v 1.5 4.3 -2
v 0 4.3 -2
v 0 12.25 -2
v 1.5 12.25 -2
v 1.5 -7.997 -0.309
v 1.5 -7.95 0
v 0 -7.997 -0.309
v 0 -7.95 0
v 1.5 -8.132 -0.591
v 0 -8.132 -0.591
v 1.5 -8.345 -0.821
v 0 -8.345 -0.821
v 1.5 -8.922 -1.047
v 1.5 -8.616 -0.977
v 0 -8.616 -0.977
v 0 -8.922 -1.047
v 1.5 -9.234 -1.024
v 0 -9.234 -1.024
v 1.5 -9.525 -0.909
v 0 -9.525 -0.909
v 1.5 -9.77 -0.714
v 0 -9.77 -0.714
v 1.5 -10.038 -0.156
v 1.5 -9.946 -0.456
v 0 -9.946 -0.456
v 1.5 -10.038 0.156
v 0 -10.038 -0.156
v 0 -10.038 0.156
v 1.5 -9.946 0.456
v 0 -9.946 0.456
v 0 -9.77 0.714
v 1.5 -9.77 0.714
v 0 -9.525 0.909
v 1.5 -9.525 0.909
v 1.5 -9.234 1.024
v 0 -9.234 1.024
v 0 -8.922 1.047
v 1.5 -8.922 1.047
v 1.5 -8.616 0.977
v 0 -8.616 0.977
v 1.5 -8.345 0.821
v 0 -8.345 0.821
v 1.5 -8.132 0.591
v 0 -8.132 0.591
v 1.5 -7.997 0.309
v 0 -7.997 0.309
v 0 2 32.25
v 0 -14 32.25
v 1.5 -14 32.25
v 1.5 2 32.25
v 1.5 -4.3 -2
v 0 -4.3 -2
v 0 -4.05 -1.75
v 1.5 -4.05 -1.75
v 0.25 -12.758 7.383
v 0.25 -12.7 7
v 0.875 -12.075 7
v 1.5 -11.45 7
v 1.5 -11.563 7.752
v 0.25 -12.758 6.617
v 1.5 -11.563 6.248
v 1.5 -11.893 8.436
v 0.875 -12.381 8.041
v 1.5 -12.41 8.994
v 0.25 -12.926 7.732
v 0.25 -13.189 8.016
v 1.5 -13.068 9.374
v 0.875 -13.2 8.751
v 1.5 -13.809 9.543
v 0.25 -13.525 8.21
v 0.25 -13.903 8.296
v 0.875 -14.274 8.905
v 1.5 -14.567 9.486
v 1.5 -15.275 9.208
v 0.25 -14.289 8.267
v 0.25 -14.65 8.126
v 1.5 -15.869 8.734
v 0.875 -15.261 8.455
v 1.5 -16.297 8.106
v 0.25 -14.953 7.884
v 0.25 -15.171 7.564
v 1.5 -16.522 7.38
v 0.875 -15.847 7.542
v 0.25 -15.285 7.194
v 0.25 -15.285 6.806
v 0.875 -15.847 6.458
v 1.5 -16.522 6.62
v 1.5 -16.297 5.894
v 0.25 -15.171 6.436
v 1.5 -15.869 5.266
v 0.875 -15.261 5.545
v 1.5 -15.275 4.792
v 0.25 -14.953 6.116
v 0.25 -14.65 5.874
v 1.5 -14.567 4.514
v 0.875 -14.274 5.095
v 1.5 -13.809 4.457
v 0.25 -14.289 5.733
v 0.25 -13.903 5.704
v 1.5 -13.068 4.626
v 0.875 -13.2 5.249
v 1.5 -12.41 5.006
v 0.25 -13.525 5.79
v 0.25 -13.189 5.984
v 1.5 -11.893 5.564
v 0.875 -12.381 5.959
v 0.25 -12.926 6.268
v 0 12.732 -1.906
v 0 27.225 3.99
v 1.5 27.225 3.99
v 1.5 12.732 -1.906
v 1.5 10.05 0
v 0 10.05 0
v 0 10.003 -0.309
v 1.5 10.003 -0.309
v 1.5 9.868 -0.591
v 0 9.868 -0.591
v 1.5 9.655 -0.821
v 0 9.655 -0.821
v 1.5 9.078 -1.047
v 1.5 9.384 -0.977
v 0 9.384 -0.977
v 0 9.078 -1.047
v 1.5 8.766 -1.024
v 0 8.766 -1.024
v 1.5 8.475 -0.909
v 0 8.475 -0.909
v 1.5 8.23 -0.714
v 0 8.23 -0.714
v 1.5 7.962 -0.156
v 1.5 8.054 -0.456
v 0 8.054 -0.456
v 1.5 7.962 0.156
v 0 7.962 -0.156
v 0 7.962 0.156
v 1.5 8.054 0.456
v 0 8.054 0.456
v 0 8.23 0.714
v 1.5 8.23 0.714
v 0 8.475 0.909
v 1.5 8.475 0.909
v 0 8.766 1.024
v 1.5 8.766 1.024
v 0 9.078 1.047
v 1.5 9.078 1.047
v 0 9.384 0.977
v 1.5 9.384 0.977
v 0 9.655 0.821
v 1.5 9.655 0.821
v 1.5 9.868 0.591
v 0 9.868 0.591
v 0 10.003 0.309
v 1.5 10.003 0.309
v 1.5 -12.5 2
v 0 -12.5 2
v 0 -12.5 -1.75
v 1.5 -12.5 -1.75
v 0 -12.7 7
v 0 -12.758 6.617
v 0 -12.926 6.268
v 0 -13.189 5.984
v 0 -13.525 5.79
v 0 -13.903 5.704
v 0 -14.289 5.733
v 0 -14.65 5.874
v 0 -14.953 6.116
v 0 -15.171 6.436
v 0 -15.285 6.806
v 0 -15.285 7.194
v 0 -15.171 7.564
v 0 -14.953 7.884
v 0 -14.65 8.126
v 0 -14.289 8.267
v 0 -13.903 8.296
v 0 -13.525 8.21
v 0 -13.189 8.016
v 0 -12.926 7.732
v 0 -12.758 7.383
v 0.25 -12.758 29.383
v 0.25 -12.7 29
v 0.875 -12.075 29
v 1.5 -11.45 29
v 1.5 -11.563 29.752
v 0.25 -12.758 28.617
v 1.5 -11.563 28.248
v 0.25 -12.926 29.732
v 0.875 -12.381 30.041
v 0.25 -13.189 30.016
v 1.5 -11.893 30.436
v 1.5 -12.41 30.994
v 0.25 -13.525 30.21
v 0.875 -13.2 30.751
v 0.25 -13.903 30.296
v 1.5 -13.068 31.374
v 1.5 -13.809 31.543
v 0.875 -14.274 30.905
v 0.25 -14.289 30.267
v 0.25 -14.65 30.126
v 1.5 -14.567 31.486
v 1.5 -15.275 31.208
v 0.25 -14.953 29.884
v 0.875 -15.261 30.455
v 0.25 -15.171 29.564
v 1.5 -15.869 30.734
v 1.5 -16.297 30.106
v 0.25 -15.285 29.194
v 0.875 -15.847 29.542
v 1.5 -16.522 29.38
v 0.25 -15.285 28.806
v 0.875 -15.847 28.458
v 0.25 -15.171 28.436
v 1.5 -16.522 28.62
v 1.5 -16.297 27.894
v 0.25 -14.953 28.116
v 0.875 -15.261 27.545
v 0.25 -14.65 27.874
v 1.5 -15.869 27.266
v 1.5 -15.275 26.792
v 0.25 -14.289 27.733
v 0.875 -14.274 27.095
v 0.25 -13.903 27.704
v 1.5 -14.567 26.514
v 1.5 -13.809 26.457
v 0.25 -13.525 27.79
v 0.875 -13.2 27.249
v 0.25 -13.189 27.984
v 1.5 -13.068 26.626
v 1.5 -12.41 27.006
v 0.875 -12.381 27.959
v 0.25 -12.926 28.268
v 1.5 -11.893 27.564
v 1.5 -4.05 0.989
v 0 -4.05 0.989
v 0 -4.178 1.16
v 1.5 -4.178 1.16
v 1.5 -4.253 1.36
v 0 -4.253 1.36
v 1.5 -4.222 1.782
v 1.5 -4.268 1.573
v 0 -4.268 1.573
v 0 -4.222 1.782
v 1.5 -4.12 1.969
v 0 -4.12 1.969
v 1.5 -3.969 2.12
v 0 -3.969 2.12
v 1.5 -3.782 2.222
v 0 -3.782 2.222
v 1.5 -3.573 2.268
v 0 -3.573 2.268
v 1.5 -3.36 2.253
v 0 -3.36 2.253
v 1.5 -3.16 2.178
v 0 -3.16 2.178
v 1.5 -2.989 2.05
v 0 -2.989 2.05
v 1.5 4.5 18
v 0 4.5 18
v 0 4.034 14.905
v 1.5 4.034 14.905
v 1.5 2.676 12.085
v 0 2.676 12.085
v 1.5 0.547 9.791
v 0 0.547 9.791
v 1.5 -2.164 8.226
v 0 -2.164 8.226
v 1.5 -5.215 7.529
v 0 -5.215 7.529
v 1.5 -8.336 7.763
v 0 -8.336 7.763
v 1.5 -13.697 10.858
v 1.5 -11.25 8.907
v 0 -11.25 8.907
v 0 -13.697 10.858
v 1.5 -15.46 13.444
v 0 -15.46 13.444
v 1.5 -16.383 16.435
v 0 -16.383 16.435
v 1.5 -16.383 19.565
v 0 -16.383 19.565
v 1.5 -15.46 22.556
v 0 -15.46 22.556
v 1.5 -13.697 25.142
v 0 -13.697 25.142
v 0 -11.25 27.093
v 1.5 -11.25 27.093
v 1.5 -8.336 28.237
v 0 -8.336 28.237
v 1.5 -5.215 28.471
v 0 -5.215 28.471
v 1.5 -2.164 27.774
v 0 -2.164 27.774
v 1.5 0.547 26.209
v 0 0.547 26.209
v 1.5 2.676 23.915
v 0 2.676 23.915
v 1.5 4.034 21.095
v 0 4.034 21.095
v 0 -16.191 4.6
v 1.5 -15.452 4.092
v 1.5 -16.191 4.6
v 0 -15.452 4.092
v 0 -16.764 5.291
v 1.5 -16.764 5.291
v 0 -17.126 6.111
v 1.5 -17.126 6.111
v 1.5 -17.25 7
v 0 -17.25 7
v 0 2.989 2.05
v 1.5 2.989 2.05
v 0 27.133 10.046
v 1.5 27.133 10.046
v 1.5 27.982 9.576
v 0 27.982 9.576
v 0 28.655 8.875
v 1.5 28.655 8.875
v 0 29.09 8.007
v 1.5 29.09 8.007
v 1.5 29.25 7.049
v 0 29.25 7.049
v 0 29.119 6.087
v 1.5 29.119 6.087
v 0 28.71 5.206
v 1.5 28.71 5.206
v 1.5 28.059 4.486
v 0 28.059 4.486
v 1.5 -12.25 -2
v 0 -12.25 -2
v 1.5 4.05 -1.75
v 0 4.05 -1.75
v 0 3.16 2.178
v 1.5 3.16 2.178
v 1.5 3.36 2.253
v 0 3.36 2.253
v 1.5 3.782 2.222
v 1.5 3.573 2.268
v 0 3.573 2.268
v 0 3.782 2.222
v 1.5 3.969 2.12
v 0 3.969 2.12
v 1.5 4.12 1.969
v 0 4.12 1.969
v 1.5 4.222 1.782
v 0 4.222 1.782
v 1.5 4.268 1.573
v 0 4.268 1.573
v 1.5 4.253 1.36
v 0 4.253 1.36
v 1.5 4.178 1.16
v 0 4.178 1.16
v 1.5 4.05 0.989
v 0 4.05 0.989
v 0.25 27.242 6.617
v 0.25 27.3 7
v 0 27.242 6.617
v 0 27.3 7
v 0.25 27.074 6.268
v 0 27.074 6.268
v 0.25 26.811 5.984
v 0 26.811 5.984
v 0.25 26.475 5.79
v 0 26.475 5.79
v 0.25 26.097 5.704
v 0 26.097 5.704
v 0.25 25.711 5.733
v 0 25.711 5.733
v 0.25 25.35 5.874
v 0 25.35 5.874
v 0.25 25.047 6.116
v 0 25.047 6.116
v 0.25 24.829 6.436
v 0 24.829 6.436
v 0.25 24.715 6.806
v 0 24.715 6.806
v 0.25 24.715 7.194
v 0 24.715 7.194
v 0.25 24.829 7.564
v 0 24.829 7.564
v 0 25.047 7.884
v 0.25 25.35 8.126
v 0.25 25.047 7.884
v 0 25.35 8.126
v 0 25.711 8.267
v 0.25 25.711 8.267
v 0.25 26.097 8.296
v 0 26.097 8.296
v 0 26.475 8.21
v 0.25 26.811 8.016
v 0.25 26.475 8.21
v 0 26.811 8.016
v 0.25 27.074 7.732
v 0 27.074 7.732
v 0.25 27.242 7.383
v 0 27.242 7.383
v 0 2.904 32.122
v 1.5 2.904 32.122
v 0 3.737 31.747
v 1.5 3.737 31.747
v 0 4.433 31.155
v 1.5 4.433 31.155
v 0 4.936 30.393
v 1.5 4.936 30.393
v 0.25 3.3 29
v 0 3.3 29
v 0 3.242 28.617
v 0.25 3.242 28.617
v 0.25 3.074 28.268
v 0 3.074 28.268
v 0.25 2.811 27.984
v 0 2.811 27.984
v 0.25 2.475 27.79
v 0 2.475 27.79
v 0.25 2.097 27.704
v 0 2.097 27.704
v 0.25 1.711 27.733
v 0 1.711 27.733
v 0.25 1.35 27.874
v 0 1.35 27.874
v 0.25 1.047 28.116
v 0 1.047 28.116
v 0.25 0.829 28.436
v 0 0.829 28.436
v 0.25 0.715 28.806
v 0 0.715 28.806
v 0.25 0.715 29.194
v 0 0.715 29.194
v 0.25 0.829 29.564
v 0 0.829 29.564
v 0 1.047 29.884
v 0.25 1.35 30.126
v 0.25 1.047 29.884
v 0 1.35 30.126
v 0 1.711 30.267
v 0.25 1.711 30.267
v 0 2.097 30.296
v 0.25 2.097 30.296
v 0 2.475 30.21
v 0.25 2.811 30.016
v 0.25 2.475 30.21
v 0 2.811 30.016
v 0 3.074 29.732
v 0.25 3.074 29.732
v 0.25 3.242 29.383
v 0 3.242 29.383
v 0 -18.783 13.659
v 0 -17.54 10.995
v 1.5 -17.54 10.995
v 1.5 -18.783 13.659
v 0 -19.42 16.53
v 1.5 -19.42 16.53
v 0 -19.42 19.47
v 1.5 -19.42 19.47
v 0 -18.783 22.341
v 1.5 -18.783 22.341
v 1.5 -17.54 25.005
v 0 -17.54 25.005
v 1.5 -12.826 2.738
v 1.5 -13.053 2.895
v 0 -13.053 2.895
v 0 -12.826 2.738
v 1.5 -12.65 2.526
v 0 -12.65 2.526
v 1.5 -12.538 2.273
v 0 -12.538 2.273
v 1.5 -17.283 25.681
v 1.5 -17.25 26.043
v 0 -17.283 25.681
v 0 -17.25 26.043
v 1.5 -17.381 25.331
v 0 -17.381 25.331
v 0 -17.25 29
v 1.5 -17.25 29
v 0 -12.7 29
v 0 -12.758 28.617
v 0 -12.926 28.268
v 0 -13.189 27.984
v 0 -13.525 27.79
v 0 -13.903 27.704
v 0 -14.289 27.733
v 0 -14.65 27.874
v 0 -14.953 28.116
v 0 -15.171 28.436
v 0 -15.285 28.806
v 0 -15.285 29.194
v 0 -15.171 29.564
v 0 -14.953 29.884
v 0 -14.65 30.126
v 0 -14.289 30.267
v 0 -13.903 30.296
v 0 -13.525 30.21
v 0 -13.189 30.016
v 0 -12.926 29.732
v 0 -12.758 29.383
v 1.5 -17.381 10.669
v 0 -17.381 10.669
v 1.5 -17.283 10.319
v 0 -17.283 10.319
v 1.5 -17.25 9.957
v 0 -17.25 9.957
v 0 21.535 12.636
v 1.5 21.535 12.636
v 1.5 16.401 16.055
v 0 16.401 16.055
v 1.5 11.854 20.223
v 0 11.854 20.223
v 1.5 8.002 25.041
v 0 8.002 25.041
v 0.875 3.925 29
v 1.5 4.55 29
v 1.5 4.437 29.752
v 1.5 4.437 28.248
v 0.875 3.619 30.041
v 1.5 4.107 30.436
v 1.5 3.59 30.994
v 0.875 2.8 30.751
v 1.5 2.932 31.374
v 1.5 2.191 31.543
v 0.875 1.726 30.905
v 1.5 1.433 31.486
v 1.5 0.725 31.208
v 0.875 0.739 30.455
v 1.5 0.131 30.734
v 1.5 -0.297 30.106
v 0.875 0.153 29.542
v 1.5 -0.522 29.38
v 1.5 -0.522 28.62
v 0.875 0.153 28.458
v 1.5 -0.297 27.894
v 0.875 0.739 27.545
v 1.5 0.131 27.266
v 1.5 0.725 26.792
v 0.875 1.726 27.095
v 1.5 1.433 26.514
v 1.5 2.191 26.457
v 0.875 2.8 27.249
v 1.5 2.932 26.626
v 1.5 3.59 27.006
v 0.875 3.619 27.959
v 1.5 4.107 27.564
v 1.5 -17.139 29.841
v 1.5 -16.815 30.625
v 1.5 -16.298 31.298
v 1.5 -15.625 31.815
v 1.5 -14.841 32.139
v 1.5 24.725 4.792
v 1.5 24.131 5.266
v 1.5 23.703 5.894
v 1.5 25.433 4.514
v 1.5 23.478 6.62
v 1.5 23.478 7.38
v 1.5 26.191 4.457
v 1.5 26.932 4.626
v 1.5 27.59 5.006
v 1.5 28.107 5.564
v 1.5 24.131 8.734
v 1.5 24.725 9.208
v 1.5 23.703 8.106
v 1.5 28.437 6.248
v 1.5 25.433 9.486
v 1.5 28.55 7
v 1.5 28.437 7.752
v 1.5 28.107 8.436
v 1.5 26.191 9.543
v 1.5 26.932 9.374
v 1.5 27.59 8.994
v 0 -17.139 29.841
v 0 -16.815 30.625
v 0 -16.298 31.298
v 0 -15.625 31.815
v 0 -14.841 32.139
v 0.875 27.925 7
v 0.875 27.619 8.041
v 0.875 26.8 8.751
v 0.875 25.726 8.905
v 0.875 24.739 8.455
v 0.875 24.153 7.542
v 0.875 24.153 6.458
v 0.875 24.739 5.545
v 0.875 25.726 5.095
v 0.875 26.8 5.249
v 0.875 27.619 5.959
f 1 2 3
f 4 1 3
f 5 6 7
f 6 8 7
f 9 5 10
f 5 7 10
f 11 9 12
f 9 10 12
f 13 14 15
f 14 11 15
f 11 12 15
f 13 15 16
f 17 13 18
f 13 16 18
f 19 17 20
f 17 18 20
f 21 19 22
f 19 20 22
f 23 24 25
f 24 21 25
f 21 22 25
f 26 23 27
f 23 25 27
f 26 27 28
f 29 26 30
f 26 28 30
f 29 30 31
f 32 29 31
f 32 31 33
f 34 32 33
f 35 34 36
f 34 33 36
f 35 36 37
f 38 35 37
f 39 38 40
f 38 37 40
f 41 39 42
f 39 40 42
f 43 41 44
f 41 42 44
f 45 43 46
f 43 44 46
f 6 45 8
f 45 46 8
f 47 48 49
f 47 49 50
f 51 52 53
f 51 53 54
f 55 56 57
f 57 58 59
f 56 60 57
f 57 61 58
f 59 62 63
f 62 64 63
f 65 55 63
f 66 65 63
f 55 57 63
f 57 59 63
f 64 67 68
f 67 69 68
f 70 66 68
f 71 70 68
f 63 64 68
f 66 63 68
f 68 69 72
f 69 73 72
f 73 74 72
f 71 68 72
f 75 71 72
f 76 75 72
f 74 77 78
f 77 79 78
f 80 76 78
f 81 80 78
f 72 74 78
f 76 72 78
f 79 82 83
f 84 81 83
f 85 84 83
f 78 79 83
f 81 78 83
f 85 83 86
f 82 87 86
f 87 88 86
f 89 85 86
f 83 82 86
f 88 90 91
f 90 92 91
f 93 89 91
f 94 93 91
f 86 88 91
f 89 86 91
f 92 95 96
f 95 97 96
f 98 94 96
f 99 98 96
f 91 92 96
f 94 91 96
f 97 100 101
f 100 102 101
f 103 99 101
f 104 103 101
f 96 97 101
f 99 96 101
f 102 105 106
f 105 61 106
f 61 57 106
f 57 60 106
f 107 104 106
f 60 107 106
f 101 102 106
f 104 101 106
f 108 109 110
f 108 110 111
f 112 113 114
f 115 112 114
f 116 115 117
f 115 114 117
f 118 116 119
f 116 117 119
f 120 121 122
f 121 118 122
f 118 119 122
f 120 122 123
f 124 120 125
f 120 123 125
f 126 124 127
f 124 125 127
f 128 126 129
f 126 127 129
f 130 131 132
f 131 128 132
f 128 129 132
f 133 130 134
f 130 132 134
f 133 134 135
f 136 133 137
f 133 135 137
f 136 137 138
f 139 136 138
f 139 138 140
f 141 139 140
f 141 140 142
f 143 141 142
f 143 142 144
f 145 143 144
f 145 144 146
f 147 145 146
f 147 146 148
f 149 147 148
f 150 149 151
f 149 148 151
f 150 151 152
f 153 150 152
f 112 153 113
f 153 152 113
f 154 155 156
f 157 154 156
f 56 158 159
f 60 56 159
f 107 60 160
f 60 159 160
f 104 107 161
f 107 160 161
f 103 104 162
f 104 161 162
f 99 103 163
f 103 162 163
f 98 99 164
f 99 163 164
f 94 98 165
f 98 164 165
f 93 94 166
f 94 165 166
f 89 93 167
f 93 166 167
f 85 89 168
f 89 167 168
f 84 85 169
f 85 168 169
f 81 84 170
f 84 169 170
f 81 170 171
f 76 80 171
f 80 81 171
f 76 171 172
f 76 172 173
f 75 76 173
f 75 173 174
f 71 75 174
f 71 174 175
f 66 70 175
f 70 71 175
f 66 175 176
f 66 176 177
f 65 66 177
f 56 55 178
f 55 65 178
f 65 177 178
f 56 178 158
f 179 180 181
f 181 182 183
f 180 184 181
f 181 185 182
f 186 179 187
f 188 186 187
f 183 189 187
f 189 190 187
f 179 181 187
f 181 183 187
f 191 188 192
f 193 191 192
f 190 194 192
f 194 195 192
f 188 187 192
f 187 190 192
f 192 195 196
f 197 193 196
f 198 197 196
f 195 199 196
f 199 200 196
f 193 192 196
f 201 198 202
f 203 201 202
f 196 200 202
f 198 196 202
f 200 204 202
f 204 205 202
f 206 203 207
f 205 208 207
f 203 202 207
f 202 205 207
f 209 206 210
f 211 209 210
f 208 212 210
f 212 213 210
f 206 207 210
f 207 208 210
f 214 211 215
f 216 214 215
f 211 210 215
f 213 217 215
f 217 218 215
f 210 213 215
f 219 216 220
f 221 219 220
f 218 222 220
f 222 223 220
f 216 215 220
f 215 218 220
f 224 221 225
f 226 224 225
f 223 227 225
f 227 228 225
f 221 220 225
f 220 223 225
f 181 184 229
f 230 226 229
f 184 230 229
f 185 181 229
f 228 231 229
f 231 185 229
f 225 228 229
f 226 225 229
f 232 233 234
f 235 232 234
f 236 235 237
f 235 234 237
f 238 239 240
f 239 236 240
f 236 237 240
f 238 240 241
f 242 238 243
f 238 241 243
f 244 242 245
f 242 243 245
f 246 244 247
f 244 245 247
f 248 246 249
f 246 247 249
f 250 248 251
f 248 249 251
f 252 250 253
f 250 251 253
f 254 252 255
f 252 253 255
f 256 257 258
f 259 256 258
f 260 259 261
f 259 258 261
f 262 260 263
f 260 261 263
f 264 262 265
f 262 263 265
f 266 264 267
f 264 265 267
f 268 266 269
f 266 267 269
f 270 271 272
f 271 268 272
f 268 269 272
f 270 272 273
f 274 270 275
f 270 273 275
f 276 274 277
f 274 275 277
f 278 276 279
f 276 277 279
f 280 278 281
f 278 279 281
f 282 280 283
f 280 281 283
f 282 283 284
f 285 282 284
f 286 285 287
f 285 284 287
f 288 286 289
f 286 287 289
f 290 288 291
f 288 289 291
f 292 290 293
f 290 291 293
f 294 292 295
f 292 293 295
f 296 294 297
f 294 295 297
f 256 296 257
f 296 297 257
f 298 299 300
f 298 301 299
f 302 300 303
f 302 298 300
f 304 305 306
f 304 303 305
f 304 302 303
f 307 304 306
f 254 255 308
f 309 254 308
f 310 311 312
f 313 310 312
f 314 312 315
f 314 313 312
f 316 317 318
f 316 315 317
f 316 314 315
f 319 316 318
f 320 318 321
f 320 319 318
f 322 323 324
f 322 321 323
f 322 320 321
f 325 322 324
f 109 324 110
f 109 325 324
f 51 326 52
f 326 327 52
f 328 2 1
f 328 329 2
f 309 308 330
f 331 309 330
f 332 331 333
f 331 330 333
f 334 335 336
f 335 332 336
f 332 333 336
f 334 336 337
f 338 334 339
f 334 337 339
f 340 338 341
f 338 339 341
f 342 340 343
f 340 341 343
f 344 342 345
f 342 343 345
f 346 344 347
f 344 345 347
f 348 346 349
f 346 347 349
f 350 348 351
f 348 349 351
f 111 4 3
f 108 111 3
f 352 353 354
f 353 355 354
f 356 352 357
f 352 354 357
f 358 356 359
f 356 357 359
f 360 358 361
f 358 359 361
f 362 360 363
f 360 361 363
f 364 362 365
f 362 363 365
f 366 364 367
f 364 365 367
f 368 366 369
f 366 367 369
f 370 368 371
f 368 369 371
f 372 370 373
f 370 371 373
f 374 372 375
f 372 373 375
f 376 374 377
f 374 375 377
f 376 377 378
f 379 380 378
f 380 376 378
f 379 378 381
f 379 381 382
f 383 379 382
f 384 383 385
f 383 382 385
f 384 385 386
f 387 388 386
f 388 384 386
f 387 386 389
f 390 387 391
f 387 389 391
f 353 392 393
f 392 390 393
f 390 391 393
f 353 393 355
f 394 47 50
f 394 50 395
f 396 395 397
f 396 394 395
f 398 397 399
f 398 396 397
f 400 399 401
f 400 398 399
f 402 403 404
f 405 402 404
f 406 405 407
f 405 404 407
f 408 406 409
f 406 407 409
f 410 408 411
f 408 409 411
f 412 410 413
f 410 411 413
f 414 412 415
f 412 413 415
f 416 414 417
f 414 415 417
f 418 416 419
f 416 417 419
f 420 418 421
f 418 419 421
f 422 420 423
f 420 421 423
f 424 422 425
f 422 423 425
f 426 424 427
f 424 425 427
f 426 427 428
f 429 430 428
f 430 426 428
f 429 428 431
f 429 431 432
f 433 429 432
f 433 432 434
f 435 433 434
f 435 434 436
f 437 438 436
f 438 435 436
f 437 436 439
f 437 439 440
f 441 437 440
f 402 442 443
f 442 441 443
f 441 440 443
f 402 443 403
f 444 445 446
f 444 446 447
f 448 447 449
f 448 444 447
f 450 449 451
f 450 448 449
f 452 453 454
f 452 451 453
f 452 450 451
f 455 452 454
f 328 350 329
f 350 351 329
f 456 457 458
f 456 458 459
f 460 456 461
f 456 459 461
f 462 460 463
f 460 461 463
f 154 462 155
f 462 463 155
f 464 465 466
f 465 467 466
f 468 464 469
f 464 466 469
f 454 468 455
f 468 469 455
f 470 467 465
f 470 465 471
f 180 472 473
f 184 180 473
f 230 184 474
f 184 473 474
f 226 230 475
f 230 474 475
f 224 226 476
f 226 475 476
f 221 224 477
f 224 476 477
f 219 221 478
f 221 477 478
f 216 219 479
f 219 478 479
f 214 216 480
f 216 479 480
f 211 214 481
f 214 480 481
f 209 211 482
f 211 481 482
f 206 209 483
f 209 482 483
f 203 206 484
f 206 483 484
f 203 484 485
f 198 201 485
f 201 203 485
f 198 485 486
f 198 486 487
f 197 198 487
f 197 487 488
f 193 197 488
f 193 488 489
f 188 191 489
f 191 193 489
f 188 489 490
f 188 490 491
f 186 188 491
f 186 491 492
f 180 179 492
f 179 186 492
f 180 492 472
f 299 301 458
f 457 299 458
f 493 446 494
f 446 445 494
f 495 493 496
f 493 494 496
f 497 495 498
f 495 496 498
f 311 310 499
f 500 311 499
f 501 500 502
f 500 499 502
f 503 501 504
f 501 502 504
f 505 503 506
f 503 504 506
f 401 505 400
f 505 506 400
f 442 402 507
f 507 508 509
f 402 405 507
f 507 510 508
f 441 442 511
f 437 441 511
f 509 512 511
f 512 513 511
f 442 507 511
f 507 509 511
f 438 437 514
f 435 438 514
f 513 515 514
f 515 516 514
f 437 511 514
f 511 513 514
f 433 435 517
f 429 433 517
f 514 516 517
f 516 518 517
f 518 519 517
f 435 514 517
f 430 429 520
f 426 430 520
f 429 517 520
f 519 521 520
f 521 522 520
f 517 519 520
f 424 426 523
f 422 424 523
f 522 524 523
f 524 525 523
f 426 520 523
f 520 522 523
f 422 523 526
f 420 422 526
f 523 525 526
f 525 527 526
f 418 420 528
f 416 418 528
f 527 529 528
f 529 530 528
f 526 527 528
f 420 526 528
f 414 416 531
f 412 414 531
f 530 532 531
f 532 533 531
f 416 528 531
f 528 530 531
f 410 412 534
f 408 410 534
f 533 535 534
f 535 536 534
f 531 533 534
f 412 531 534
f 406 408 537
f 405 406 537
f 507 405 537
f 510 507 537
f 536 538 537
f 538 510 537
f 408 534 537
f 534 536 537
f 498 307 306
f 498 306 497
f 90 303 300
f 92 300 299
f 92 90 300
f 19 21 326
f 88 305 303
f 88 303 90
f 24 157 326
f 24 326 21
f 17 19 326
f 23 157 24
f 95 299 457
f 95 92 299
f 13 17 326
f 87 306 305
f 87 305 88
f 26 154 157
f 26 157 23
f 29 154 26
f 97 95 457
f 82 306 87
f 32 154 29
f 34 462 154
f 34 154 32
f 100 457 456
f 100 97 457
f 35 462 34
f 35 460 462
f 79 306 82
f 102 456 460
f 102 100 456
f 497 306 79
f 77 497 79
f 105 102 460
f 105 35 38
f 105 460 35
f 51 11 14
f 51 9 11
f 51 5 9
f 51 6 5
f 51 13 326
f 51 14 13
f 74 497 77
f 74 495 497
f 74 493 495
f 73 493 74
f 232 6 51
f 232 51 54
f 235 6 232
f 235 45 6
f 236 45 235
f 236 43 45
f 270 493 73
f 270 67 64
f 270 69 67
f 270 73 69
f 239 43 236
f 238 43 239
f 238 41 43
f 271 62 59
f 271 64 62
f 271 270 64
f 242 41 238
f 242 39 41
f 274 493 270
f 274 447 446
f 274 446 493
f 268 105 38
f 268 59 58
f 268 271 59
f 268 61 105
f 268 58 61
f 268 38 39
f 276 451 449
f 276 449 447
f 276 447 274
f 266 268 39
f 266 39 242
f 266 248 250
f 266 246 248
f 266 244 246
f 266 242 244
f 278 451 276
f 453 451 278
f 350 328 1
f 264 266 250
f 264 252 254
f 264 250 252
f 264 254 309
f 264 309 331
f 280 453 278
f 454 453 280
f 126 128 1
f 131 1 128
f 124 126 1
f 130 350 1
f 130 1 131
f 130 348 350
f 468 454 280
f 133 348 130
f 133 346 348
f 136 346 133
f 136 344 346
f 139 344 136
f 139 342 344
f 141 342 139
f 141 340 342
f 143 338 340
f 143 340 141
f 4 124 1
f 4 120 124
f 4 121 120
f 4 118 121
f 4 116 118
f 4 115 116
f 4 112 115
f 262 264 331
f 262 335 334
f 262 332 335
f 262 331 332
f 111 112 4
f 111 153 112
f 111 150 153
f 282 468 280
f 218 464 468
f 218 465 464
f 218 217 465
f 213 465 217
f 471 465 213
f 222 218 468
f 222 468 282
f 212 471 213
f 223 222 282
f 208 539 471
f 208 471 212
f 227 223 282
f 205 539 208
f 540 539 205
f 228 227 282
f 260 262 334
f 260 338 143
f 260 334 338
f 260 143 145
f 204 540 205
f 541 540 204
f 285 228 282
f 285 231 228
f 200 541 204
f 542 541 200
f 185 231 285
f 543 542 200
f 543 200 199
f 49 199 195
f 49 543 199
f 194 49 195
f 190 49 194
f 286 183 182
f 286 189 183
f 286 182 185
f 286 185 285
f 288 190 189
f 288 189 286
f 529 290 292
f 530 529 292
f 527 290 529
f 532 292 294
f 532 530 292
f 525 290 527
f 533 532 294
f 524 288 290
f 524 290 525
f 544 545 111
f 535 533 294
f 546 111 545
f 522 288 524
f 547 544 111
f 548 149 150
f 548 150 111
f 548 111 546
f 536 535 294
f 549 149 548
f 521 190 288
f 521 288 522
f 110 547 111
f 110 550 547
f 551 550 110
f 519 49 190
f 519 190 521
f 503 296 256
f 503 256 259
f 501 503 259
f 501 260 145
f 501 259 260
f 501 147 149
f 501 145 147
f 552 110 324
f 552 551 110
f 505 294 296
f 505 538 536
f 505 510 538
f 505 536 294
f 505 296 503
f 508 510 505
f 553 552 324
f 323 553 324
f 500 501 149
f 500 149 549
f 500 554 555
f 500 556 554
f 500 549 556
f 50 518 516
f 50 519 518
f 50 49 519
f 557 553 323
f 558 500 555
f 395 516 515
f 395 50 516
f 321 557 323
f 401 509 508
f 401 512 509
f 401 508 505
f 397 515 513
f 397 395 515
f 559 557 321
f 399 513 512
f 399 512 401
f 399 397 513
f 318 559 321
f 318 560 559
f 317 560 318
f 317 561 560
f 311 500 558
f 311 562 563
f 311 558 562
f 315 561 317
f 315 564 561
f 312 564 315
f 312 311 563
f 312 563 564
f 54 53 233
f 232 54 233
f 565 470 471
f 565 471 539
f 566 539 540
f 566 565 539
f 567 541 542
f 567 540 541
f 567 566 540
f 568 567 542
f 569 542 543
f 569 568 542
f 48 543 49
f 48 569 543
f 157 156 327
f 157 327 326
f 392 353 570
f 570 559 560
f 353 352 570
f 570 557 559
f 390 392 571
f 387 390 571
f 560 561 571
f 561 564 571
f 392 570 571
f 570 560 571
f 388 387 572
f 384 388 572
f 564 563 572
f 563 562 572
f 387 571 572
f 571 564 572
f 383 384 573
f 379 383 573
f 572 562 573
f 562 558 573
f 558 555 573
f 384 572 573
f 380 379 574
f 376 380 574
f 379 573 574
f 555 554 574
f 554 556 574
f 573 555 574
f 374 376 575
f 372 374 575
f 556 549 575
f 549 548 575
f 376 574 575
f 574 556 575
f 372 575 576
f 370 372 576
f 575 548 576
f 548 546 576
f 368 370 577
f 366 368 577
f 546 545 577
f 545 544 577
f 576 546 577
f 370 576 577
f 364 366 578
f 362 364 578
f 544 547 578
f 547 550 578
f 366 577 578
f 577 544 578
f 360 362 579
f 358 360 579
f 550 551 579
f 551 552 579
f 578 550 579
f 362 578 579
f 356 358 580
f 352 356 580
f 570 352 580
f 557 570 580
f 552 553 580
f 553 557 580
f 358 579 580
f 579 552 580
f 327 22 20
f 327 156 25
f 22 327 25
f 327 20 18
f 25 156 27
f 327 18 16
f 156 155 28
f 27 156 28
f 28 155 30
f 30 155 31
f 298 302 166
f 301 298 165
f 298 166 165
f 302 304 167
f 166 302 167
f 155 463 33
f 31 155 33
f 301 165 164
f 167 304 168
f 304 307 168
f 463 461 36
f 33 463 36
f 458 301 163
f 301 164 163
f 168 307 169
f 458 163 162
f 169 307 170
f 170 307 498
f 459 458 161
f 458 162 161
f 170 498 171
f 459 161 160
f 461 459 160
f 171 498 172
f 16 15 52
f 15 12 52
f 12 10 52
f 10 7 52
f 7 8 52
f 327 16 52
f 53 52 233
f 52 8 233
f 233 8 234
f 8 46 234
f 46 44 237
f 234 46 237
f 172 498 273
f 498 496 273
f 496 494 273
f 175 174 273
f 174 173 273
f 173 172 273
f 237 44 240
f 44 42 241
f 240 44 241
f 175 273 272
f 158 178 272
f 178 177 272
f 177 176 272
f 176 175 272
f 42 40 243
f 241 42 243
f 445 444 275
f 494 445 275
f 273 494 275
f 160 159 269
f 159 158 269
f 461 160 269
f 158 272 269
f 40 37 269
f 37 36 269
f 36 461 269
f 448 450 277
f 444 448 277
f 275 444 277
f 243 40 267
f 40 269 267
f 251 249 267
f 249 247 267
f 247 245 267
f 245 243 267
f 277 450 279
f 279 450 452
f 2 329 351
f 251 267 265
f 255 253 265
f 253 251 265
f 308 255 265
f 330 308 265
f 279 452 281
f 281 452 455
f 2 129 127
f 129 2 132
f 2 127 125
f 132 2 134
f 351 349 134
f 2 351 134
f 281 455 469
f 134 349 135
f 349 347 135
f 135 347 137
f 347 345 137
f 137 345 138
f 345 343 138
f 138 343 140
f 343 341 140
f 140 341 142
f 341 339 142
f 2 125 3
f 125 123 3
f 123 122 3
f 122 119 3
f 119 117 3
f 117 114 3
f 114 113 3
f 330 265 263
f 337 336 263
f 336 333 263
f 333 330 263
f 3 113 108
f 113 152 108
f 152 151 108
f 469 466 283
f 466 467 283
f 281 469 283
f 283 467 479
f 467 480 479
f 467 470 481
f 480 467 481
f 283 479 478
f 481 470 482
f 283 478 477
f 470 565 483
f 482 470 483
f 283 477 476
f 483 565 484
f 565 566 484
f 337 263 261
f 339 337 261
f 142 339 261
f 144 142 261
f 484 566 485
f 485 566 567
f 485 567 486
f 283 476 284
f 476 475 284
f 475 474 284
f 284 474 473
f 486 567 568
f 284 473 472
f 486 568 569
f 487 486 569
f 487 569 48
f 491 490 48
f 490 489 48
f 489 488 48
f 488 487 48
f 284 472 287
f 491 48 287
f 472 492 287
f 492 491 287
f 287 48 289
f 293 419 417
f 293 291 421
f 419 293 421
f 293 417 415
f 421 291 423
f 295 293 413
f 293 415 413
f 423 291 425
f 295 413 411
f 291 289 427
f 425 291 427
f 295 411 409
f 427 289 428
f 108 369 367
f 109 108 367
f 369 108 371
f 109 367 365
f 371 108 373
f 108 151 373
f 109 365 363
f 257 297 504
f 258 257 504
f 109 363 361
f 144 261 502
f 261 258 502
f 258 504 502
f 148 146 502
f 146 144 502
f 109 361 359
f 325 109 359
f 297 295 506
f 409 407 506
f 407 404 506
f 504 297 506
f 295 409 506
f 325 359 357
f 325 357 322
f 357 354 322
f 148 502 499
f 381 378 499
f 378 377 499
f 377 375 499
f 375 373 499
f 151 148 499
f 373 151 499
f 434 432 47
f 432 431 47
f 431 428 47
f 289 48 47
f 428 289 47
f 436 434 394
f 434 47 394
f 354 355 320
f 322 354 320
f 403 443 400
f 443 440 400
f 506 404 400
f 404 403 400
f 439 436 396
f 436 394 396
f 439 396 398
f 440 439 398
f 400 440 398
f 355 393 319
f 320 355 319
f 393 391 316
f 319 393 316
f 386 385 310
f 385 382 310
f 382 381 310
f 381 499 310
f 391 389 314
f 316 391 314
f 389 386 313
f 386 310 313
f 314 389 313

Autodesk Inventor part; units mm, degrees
ref_plane "YZ Plane" through (0, 0, 0) normal (1, 0, 0) x (0, 1, 0)
ref_plane "XZ Plane" through (0, 0, 0) normal (0, 1, 0) x (-1, 0, 0)
ref_plane "XY Plane" through (0, 0, 0) normal (0, 0, 1) x (1, 0, 0)
sketch "スケッチ1" plane through (0, 0, 0) normal (1, 0, 0) x (0, 1, 0)
  line L0 (12.5, 2) -> (-12.5, 2) construction
  line L1 (-12.5, 2) -> (-12.5, -2)
  line L2 (-12.5, -2) -> (-4.05, -2)
  line L3 (12.5, -2) -> (12.5, 2) construction
  line L4 (0, 0) -> (0, 21.2341) construction
  line L5 (0, 0) -> (25.6299, 0) construction
  circle A0 centre (9, 0) radius 1.05
  circle A1 centre (-9, 0) radius 1.05
  line L6 (-17.25, 7) -> (-17.25, 9.9571)
  line L7 (-14, 32.25) -> (2, 32.25)
  arc A2 (4.9363, 30.393) -> (27.1329, 10.0462) centre (41.0759, 47.5374) ccw
  arc A3 (-17.25, 7) -> (-15.4518, 4.0923) centre (-14, 7) ccw
  arc A4 (-14, 32.25) -> (-17.25, 29) centre (-14, 29) ccw
  arc A5 (4.9363, 30.393) -> (2, 32.25) centre (2, 29) ccw
  circle A6 centre (2, 29) radius 1.3
  circle A7 centre (-14, 29) radius 1.3
  circle A8 centre (-14, 7) radius 1.3
  circle A9 centre (26, 7) radius 1.3
  arc A10 (27.2246, 3.9895) -> (27.1329, 10.0462) centre (26, 7) ccw
  line L8 (2, 29) -> (-14, 29) construction
  line L9 (-6, 29) -> (-6, 7) construction
  line L10 (-6, 7) -> (-14, 7) construction
  circle A11 centre (-6, 18) radius 10.5
  arc A12 (-17.5403, 25.0051) -> (-17.5403, 10.9949) centre (-6, 18) ccw
  line L11 (-17.25, 10.5376) -> (-17.25, 25.4624) construction
  line L12 (-17.25, 26.0429) -> (-17.25, 29)
  arc A13 (-17.5403, 25.0051) -> (-17.25, 26.0429) centre (-19.25, 26.0429) ccw
  arc A14 (-17.25, 9.9571) -> (-17.5403, 10.9949) centre (-19.25, 9.9571) ccw
  line L13 (-6, 18) -> (10, 18) construction
  line L14 (27.2246, 3.9895) -> (12.5, -2)
  line L15 (-4.05, -2) -> (-4.05, 0.9893)
  line L16 (-4.05, 2.05) -> (-2.9893, 2.05) construction
  line L17 (4.05, 2.05) -> (4.05, 0.9893) construction
  line L18 (-4.05, -2) -> (4.05, -2) construction
  line L19 (4.05, -2) -> (12.5, -2)
  arc A15 (4.05, 0.9893) -> (2.9893, 2.05) centre (3.5197, 1.5197) ccw
  line L20 (4.05, 0.9893) -> (4.05, -2)
  line L21 (2.9893, 2.05) -> (4.05, 2.05) construction
  line L22 (-2.9893, 2.05) -> (2.9893, 2.05)
  line L23 (-4.05, 0.9893) -> (-4.05, 2.05) construction
  arc A16 (-2.9893, 2.05) -> (-4.05, 0.9893) centre (-3.5197, 1.5197) ccw
  line L24 (3.5197, 1.5197) -> (4.05, 2.05) construction
  line L25 (-3.5197, 1.5197) -> (-4.05, 2.05) construction
  line L26 (-12.5, -2) -> (-12.5, 2) construction
  arc A17 (-12.5, 2) -> (-13.0533, 2.8947) centre (-13.5, 2) ccw
  line L27 (-15.4518, 4.0923) -> (-13.0533, 2.8947)
  point P0 (4.1125, 32.25)
  point P1 (16.6739, 3.086)
  dimension "d2" = 18
  dimension "d3" = 2.1
  dimension "d7" = 16
  dimension "d8" = 2.6
  dimension "d13" = 3.25
  dimension "d14" = 21
  dimension "d15" = 40
  dimension "d17" = 40
  dimension "d18" = 6
  dimension "d21" = 3
  dimension "d22" = 2
  dimension "d27" = 18
  dimension "d28" = 22
  dimension "d30" = 8.1
  dimension "d31" = 4
  dimension "d32" = 4.05
  dimension "d33" = 0.75
  dimension "d34" = 45
  dimension "d35" = 45
  dimension "d36" = 1
extrude "押し出し1" add sketch "スケッチ1" along normal blind 1.5
chamfer "面取り1" distance 0.25 angle 45 4 edges at (0.75, -12.5, -2) (0.75, -4.05, -2) (0.75, 4.05, -2) (0.75, 12.5, -2)
chamfer "面取り2" distance 1.25 angle 45 4 edges at (1.5, 24.7, 7) (1.5, 0.7, 29) (1.5, -15.3, 29) (1.5, -15.3, 7)
properties part number "16_006_COXA_FRAME_1_R1"
